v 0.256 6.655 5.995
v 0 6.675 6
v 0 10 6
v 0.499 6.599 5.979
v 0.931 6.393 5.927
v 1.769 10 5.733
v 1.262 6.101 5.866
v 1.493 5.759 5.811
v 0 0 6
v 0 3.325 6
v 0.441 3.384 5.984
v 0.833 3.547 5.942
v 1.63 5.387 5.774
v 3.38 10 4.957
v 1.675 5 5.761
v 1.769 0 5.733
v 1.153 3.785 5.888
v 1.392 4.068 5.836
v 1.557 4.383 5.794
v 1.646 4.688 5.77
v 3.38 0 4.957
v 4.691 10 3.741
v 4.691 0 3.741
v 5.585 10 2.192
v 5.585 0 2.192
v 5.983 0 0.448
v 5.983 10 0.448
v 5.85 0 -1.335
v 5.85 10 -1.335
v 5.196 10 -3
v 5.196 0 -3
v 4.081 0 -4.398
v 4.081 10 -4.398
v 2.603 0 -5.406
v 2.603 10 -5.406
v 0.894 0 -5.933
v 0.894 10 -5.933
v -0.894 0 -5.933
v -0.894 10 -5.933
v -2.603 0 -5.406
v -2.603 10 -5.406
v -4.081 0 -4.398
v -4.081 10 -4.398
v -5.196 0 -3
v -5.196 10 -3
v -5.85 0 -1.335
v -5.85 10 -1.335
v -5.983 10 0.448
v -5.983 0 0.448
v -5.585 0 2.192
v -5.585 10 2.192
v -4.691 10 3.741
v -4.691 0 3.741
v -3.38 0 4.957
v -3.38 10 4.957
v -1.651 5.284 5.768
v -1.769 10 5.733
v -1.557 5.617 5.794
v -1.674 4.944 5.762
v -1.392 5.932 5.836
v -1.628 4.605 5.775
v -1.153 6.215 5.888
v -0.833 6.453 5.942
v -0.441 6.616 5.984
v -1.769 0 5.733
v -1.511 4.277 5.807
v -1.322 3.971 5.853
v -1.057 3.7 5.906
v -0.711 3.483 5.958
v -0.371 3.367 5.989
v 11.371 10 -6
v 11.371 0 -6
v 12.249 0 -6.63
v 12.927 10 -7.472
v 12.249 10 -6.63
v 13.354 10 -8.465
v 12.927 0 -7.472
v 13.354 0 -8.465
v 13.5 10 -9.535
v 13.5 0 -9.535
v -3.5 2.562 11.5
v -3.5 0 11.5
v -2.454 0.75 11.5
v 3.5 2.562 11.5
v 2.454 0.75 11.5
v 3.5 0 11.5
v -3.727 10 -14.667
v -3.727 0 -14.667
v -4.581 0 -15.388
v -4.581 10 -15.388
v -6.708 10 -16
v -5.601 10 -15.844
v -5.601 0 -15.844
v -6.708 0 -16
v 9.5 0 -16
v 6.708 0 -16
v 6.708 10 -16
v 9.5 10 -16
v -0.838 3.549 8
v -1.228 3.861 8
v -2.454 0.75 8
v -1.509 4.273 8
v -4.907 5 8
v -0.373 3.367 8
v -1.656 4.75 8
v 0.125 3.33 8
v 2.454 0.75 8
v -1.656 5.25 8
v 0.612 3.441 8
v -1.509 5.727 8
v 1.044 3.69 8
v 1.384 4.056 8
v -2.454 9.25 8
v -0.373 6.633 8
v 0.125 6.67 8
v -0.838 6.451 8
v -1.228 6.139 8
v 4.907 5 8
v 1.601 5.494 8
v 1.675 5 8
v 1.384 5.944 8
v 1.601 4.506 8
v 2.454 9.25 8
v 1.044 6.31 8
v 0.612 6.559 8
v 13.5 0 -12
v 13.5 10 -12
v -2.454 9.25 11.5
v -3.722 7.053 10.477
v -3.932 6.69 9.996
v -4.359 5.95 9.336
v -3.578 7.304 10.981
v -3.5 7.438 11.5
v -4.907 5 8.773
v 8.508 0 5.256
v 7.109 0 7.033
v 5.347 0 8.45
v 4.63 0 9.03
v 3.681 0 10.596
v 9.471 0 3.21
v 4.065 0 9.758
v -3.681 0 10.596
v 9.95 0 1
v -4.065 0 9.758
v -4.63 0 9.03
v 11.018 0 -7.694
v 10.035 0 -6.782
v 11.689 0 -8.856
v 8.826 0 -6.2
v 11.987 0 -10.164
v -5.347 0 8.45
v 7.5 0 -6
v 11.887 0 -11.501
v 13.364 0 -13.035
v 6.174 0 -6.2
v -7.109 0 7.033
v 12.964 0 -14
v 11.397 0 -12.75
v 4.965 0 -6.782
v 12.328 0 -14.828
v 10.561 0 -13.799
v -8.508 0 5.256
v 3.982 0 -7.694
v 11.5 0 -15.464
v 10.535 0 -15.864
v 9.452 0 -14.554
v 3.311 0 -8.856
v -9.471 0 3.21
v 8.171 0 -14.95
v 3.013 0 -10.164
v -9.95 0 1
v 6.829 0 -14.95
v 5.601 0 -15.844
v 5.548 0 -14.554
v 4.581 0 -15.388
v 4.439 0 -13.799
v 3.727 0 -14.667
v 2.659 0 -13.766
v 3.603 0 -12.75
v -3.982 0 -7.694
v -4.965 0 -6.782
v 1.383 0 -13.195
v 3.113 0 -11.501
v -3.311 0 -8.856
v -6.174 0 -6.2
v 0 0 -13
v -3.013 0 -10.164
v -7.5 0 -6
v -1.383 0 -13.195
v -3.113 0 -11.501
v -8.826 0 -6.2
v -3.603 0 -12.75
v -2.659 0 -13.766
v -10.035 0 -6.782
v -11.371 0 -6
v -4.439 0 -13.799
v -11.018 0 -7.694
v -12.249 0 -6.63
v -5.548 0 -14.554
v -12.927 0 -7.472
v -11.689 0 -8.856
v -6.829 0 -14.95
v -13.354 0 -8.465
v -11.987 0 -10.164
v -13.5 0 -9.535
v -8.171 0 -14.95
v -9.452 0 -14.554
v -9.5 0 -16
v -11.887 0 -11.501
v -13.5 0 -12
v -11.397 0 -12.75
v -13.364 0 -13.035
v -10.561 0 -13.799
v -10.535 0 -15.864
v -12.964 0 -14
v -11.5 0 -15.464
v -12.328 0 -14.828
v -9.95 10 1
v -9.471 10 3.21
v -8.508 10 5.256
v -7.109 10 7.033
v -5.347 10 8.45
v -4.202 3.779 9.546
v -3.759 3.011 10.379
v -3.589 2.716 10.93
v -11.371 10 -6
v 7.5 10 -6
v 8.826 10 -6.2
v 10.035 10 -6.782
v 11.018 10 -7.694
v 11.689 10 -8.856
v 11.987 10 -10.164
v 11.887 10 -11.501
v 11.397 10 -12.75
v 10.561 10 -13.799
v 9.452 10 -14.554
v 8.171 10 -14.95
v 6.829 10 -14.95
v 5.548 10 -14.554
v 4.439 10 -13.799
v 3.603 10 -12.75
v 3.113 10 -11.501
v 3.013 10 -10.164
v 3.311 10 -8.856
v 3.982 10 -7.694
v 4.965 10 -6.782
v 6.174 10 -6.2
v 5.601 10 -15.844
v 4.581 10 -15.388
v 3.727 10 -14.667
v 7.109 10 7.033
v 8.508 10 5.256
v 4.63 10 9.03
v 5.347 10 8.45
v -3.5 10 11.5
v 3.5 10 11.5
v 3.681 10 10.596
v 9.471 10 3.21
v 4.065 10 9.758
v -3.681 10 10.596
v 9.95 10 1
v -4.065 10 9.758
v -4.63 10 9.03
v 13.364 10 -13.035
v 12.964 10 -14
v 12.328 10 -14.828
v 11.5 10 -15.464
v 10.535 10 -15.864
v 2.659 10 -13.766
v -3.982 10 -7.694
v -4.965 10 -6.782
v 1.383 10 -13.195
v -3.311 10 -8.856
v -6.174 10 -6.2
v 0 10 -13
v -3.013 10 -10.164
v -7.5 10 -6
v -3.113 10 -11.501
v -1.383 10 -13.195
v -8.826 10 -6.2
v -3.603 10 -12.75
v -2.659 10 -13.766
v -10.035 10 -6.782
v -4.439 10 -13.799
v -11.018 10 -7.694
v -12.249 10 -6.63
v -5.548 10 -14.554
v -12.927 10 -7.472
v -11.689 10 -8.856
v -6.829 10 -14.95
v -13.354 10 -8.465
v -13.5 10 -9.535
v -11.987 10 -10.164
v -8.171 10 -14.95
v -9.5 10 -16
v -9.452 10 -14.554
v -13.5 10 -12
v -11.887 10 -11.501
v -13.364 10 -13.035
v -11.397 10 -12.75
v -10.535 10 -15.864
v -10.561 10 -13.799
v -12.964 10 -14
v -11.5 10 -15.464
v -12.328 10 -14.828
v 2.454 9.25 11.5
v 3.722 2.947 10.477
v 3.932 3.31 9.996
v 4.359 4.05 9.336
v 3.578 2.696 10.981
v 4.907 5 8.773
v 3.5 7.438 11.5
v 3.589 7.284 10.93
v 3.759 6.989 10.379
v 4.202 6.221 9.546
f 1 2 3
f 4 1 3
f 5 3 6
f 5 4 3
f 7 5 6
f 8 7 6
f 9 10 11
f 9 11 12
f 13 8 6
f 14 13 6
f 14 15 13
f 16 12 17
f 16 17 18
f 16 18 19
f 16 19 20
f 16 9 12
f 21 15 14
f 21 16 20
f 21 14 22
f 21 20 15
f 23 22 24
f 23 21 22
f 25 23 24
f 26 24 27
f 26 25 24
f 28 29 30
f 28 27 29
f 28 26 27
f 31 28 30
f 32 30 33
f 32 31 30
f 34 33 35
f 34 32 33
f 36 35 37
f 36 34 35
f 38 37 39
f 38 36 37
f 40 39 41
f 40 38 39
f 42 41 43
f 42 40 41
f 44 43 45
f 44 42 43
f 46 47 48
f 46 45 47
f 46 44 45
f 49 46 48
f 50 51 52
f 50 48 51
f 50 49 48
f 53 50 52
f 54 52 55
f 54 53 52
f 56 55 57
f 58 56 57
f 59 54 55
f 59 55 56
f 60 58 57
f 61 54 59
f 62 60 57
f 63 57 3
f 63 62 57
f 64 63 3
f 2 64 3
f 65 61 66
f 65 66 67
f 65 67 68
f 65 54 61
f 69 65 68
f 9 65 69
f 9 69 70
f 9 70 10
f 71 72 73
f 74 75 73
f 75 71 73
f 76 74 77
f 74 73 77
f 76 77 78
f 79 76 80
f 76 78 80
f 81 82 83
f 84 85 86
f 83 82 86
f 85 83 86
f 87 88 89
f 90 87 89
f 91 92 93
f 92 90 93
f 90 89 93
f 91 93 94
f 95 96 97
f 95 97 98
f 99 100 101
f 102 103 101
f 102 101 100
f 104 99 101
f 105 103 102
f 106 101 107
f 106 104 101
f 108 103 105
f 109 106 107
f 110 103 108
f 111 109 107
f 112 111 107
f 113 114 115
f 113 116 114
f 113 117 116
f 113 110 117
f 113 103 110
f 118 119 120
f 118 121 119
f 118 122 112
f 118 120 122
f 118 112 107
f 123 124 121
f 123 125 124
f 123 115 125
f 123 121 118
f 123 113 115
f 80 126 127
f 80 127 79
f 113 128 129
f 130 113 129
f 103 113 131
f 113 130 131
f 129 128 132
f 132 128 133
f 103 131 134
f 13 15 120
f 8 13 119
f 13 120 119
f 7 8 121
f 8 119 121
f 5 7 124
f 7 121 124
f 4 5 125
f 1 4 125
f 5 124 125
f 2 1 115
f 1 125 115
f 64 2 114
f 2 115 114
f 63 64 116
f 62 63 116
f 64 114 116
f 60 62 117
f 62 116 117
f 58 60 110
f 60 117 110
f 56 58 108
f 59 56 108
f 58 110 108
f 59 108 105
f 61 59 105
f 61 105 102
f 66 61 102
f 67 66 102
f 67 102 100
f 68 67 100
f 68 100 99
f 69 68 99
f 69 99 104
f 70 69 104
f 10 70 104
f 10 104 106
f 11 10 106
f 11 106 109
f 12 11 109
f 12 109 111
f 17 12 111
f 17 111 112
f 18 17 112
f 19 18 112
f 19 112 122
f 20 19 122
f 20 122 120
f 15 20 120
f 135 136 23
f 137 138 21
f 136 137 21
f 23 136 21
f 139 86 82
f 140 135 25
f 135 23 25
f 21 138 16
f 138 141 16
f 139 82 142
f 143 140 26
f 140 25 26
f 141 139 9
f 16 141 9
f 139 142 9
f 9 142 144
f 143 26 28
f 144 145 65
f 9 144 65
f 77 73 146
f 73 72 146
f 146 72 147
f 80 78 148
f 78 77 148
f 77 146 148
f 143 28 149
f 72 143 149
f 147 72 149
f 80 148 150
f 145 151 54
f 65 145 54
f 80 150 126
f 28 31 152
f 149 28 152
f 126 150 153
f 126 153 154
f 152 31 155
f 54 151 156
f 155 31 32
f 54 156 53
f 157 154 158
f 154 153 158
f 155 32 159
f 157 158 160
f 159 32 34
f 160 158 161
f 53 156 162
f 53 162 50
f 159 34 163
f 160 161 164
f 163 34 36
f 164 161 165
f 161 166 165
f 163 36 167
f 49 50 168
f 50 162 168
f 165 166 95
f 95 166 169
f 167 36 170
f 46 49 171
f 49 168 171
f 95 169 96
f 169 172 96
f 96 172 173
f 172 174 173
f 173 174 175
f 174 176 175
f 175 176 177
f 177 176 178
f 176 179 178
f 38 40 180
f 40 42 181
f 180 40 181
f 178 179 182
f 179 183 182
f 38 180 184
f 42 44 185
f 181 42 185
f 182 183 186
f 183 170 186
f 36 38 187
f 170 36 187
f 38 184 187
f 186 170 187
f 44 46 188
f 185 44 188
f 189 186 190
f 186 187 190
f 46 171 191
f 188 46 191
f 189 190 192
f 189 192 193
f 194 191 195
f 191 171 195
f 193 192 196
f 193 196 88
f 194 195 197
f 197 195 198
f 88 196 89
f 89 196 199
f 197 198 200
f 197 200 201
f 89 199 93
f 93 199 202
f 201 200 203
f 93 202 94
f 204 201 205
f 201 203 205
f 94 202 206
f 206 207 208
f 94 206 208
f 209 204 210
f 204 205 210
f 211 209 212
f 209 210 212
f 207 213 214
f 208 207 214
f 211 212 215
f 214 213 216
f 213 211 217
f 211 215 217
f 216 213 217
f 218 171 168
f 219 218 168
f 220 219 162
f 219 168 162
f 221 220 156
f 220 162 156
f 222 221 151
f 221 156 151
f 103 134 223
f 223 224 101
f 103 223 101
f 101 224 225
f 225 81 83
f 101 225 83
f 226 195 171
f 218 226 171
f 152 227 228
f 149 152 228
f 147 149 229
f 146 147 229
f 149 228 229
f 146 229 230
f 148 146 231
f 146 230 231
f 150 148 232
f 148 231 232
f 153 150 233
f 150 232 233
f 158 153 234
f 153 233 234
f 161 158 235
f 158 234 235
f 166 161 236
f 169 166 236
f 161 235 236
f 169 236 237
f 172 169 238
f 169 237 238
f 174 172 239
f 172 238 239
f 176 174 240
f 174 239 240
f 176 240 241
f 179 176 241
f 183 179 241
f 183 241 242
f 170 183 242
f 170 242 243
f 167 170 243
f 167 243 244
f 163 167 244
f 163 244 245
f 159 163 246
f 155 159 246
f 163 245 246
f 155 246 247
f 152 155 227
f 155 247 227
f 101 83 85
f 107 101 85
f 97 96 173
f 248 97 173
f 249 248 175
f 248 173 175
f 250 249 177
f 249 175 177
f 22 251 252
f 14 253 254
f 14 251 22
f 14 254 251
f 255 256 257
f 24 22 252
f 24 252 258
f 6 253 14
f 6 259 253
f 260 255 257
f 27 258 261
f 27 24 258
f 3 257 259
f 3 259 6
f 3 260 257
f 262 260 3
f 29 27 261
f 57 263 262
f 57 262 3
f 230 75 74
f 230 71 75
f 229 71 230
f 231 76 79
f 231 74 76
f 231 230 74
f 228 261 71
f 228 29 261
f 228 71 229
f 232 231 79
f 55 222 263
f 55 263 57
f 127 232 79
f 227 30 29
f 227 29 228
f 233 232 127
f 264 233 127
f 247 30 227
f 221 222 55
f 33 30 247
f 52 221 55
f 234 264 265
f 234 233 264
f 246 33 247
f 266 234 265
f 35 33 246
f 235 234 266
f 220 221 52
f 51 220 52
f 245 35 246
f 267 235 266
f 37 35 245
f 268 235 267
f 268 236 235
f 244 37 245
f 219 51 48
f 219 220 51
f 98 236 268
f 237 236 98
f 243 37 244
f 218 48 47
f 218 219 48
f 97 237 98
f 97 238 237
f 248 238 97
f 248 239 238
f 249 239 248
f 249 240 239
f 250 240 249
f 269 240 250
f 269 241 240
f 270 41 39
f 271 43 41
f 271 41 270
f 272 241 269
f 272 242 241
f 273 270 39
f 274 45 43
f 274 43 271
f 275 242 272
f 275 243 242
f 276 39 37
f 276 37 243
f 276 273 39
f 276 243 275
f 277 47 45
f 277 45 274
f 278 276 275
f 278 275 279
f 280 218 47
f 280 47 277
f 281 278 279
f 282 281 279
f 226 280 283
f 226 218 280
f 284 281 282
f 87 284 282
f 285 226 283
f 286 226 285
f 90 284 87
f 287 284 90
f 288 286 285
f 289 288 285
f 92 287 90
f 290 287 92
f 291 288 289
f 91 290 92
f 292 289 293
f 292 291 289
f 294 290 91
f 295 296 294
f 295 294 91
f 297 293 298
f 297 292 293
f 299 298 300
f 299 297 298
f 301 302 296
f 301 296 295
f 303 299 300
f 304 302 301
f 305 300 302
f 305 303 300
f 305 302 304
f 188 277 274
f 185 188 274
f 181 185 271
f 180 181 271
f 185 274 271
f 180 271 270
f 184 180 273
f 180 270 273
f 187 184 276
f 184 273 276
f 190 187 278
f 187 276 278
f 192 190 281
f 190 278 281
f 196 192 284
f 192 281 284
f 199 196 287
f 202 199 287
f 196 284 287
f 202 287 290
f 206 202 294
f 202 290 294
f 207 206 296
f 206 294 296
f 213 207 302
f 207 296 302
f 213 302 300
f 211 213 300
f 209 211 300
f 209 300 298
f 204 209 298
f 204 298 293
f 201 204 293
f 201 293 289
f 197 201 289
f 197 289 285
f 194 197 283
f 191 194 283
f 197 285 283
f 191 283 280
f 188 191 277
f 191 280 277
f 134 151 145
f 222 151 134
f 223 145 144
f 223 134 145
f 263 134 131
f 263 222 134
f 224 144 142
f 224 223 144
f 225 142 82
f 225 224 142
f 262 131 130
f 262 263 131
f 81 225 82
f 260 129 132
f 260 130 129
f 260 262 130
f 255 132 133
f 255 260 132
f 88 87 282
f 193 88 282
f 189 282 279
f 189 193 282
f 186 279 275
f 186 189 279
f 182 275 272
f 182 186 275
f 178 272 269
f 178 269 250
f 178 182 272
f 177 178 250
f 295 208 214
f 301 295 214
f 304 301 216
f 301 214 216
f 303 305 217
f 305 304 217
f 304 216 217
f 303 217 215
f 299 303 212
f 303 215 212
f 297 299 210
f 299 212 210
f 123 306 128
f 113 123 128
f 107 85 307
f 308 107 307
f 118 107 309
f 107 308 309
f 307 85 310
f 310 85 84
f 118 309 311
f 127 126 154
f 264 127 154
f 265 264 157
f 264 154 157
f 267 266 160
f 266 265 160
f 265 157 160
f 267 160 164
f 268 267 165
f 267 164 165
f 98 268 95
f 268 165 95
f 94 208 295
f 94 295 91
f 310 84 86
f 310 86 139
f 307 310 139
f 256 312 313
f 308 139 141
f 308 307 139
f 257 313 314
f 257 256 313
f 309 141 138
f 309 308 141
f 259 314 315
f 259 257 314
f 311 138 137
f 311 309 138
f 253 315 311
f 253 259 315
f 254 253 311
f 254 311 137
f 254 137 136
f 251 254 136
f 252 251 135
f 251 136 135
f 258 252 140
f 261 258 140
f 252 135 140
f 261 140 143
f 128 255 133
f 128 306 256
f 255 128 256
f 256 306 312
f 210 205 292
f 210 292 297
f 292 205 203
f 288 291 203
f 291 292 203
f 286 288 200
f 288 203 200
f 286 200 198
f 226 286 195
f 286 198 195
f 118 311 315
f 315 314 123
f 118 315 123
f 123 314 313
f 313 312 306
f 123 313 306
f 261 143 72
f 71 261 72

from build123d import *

# Parameters (mm, degrees)
CROQUIS1_R              = 10
CROQUIS1_R_2            = 6
SALIENTE_EXTRUIR1_DEPTH = 10
CROQUIS2_R              = 4.5
CORTAR_EXTRUIR1_DEPTH   = 10
CHAFL_N1_DEPTH          = 10
CROQUIS3_W              = 7
CROQUIS3_H              = 3
SALIENTE_EXTRUIR2_DEPTH = 10
CROQUIS4_R              = 1.675
CORTAR_EXTRUIR2_DEPTH   = 10
REDONDEO2_R             = 4
CORTAR_EXTRUIR3_DEPTH   = 3.5


with BuildPart() as part:
    # Croquis1 → Saliente-Extruir1 (new body)
    # profile 1 of 2: a face of its own
    with BuildSketch(Plane(origin=(0, 0, 0), x_dir=(1, 0, 0), z_dir=(0, 1, 0))):
        Circle(CROQUIS1_R)
        with Locations(Location((0, 0, 0), (0, 0, 270))):
            Circle(CROQUIS1_R_2, mode=Mode.SUBTRACT)
    # profile 2 of 2: a face of its own
    with BuildSketch(Plane(origin=(0, 0, 0), x_dir=(1, 0, 0), z_dir=(0, 1, 0))):
        with BuildLine():
            Line((-13.5, 16), (-4.582575695, 16))
            ThreePointArc((-4.582575695, 16), (0, 13), (4.582575695, 16))
            Line((4.582575695, 16), (13.5, 16))
            Line((13.5, 16), (13.5, 6))
            Line((13.5, 6), (-13.5, 6))
            Line((-13.5, 6), (-13.5, 16))
        make_face()
    extrude(amount=SALIENTE_EXTRUIR1_DEPTH)

    # Croquis2 → Cortar-Extruir1 (cut)
    with BuildSketch(Plane(origin=(0, 10, 0), x_dir=(1, 0, 0), z_dir=(0, 1, 0))):
        with Locations(Location((-7.5, 10.5, 0), (0, 0, 270))):
            Circle(CROQUIS2_R)
        with Locations(Location((7.5, 10.5, 0), (0, 0, 270))):
            Circle(CROQUIS2_R)
    extrude(amount=-CORTAR_EXTRUIR1_DEPTH, mode=Mode.SUBTRACT)

    # Chaflán1: read off the stored shape, not the designer's step
    # Chaflán1 outline → Chaflán1 (add)
    with BuildSketch(Plane(origin=(0, 0, 0), x_dir=(1, 0, 0), z_dir=(0, 1, 0))):
        with BuildLine():
            ThreePointArc((8, 6), (9.633249581, 2.68337521), (9.949874371, -1))
            Line((9.949874371, -1), (11.371284996, 6))
            Line((11.371284996, 6), (8, 6))
        make_face()
        with BuildLine():
            Line((-11.371284996, 6), (-9.949874371, -1))
            ThreePointArc((-9.949874371, -1), (-9.633249581, 2.68337521), (-8, 6))
            Line((-8, 6), (-11.371284996, 6))
        make_face()
    extrude(amount=CHAFL_N1_DEPTH)

    # Croquis3 → Saliente-Extruir2 (add)
    with BuildSketch(Plane(origin=(0, 0, 0), x_dir=(1, 0, 0), z_dir=(0, 1, 0))):
        with Locations((0, -10)):
            Rectangle(CROQUIS3_W, CROQUIS3_H)
    extrude(amount=SALIENTE_EXTRUIR2_DEPTH)

    # Croquis4 → Cortar-Extruir2 (cut)
    with BuildSketch(Plane.XY.offset(11.5)):
        with Locations((0, 5)):
            Circle(CROQUIS4_R)
    extrude(amount=-CORTAR_EXTRUIR2_DEPTH, mode=Mode.SUBTRACT)

    # Redondeo2
    # the kernel refuses this fillet: 4 mm, written as the material it adds along each edge
    with BuildSketch(Plane(origin=(-3.5, 10, 9.367496998), x_dir=(-0.8956592986601979, 0, -0.4447408467001005), z_dir=(0, -1, 0))) as redondeo2_piece_1:
        with BuildLine():
            CenterArc((2.475122402, -3.978671502), REDONDEO2_R, 95.919444292, 52.938021971)
            Line((-0.948411191, -1.909996144), (-1.016881863, -1.868622636))
            ThreePointArc((-1.016881863, -1.868622636), (-0.545858339, -0.919418804), (-0.071652744, 0.035579268))
            Line((-0.071652744, 0.035579268), (0.008250408, 0.07957343))
            ThreePointArc((0.008250408, 0.07957343), (1.031301001, 0.026678755), (2.054351594, 0.07957343))
            Line((2.054351594, 0.07957343), (2.062602002, 0))
        make_face()
    extrude(amount=10)
    with BuildSketch(Plane(origin=(3.5, 10, 9.367496998), x_dir=(0, 0, 1), z_dir=(0, -1, 0))) as redondeo2_piece_2:
        with BuildLine():
            CenterArc((2.462746094, -3.986344127), REDONDEO2_R, 94.735774331, 52.938021971)
            Line((-0.917323361, -1.847388662), (-0.98492475, -1.804609553))
            ThreePointArc((-0.98492475, -1.804609553), (-0.482556755, -0.911829199), (-0.074939976, 0.028))
            Line((-0.074939976, 0.028), (0, 0.08))
            ThreePointArc((0, 0.08), (1.066251501, 0.08), (2.125898141, 0.079726883))
            Line((2.125898141, 0.079726883), (2.132503002, 0))
        make_face()
    extrude(amount=10)
    # the kernel refuses this fillet: 4 mm, written as the material it takes off along each edge
    with BuildSketch(Plane(origin=(13.5, -10, -16), x_dir=(-1, 0, 0), z_dir=(0, 1, 0)), Plane(origin=(-13.5, -10, -16), x_dir=(0, 0, 1), z_dir=(0, 1, 0))) as redondeo2_2_piece_1:
        with BuildLine():
            CenterArc((REDONDEO2_R, REDONDEO2_R), REDONDEO2_R, 180, 90)
            Line((0, REDONDEO2_R), (-REDONDEO2_R * 0.02, REDONDEO2_R))
            Line((-REDONDEO2_R * 0.02, REDONDEO2_R), (-REDONDEO2_R * 0.02, -REDONDEO2_R * 0.02))
            Line((-REDONDEO2_R * 0.02, -REDONDEO2_R * 0.02), (REDONDEO2_R, -REDONDEO2_R * 0.02))
            Line((REDONDEO2_R, -REDONDEO2_R * 0.02), (REDONDEO2_R, 0))
        make_face()
    extrude(amount=30, mode=Mode.SUBTRACT)
    with BuildSketch(Plane(origin=(13.5, -8.838231039, -6), x_dir=(0, 0, -1), z_dir=(0, 1, 0))) as redondeo2_2_piece_2:
        with BuildLine():
            CenterArc((3.535292416, 4), REDONDEO2_R, 207.892961789, 62.107038211)
            Line((0, 2.128715004), (-0.070705848, 2.091289304))
            ThreePointArc((-0.070705848, 2.091289304), (-0.08, 1.064357502), (-0.08, 0))
            Line((-0.08, 0), (0, -0.08))
            Line((0, -0.08), (3.535292416, -0.08))
            Line((3.535292416, -0.08), (3.535292416, 0))
        make_face()
    extrude(amount=27.676462078, mode=Mode.SUBTRACT)
    with BuildSketch(Plane(origin=(-13.5, -8.838231039, -6), x_dir=(1, 0, 0), z_dir=(0, 1, 0))) as redondeo2_2_piece_3:
        with BuildLine():
            CenterArc((4, 3.535292416), REDONDEO2_R, 180, 62.107038211)
            Line((0, 3.535292416), (-0.08, 3.535292416))
            Line((-0.08, 3.535292416), (-0.08, 0))
            Line((-0.08, 0), (0, -0.08))
            ThreePointArc((0, -0.08), (1.064357502, -0.08), (2.091289304, -0.070705848))
            Line((2.091289304, -0.070705848), (2.128715004, 0))
        make_face()
    extrude(amount=27.676462078, mode=Mode.SUBTRACT)
    with BuildSketch(Plane(origin=(4.582575695, -5.314070594, -16), x_dir=(-0.5401558180759948, 0, 0.8415650255319863), z_dir=(0, 1, 0))) as redondeo2_2_piece_4:
        with BuildLine():
            CenterArc((2.218089643, 3.949477654), REDONDEO2_R, 212.694246687, 48.189685104)
            Line((-1.14817046, 1.788854382), (-1.215495662, 1.745641917))
            Line((-1.215495662, 1.745641917), (-0.067325202, -0.043212465))
            Line((-0.067325202, -0.043212465), (0.012674798, -0.078989553))
            ThreePointArc((0.012674798, -0.078989553), (0.792174872, -0.016847068), (1.571674947, -0.078989553))
            Line((1.571674947, -0.078989553), (1.584349745, 0))
        make_face()
    extrude(amount=20.628141188, mode=Mode.SUBTRACT)
    with BuildSketch(Plane(origin=(-4.582575695, -5.314070594, -16), x_dir=(-1, 0, 0), z_dir=(0, 1, 0))) as redondeo2_2_piece_5:
        with BuildLine():
            CenterArc((2.125628238, 4), REDONDEO2_R, 221.810314896, 48.189685104)
            Line((-0.855795732, 1.333333333), (-0.915424212, 1.28))
            ThreePointArc((-0.915424212, 1.28), (-0.442075769, 0.657566625), (-0.073321211, -0.032))
            Line((-0.073321211, -0.032), (0, -0.08))
            Line((0, -0.08), (2.125628238, -0.08))
            Line((2.125628238, -0.08), (2.125628238, 0))
        make_face()
    extrude(amount=20.628141188, mode=Mode.SUBTRACT)

    # Croquis5 → Cortar-Extruir3 (cut)
    with BuildSketch(Plane.XY.offset(11.5)):
        Polygon((4.907477288, 5), (2.453738644, 9.25), (-2.453738644, 9.25), (-4.907477288, 5), (-2.453738644, 0.75), (2.453738644, 0.75), align=None)
    extrude(amount=-CORTAR_EXTRUIR3_DEPTH, mode=Mode.SUBTRACT)


solid = part.part
